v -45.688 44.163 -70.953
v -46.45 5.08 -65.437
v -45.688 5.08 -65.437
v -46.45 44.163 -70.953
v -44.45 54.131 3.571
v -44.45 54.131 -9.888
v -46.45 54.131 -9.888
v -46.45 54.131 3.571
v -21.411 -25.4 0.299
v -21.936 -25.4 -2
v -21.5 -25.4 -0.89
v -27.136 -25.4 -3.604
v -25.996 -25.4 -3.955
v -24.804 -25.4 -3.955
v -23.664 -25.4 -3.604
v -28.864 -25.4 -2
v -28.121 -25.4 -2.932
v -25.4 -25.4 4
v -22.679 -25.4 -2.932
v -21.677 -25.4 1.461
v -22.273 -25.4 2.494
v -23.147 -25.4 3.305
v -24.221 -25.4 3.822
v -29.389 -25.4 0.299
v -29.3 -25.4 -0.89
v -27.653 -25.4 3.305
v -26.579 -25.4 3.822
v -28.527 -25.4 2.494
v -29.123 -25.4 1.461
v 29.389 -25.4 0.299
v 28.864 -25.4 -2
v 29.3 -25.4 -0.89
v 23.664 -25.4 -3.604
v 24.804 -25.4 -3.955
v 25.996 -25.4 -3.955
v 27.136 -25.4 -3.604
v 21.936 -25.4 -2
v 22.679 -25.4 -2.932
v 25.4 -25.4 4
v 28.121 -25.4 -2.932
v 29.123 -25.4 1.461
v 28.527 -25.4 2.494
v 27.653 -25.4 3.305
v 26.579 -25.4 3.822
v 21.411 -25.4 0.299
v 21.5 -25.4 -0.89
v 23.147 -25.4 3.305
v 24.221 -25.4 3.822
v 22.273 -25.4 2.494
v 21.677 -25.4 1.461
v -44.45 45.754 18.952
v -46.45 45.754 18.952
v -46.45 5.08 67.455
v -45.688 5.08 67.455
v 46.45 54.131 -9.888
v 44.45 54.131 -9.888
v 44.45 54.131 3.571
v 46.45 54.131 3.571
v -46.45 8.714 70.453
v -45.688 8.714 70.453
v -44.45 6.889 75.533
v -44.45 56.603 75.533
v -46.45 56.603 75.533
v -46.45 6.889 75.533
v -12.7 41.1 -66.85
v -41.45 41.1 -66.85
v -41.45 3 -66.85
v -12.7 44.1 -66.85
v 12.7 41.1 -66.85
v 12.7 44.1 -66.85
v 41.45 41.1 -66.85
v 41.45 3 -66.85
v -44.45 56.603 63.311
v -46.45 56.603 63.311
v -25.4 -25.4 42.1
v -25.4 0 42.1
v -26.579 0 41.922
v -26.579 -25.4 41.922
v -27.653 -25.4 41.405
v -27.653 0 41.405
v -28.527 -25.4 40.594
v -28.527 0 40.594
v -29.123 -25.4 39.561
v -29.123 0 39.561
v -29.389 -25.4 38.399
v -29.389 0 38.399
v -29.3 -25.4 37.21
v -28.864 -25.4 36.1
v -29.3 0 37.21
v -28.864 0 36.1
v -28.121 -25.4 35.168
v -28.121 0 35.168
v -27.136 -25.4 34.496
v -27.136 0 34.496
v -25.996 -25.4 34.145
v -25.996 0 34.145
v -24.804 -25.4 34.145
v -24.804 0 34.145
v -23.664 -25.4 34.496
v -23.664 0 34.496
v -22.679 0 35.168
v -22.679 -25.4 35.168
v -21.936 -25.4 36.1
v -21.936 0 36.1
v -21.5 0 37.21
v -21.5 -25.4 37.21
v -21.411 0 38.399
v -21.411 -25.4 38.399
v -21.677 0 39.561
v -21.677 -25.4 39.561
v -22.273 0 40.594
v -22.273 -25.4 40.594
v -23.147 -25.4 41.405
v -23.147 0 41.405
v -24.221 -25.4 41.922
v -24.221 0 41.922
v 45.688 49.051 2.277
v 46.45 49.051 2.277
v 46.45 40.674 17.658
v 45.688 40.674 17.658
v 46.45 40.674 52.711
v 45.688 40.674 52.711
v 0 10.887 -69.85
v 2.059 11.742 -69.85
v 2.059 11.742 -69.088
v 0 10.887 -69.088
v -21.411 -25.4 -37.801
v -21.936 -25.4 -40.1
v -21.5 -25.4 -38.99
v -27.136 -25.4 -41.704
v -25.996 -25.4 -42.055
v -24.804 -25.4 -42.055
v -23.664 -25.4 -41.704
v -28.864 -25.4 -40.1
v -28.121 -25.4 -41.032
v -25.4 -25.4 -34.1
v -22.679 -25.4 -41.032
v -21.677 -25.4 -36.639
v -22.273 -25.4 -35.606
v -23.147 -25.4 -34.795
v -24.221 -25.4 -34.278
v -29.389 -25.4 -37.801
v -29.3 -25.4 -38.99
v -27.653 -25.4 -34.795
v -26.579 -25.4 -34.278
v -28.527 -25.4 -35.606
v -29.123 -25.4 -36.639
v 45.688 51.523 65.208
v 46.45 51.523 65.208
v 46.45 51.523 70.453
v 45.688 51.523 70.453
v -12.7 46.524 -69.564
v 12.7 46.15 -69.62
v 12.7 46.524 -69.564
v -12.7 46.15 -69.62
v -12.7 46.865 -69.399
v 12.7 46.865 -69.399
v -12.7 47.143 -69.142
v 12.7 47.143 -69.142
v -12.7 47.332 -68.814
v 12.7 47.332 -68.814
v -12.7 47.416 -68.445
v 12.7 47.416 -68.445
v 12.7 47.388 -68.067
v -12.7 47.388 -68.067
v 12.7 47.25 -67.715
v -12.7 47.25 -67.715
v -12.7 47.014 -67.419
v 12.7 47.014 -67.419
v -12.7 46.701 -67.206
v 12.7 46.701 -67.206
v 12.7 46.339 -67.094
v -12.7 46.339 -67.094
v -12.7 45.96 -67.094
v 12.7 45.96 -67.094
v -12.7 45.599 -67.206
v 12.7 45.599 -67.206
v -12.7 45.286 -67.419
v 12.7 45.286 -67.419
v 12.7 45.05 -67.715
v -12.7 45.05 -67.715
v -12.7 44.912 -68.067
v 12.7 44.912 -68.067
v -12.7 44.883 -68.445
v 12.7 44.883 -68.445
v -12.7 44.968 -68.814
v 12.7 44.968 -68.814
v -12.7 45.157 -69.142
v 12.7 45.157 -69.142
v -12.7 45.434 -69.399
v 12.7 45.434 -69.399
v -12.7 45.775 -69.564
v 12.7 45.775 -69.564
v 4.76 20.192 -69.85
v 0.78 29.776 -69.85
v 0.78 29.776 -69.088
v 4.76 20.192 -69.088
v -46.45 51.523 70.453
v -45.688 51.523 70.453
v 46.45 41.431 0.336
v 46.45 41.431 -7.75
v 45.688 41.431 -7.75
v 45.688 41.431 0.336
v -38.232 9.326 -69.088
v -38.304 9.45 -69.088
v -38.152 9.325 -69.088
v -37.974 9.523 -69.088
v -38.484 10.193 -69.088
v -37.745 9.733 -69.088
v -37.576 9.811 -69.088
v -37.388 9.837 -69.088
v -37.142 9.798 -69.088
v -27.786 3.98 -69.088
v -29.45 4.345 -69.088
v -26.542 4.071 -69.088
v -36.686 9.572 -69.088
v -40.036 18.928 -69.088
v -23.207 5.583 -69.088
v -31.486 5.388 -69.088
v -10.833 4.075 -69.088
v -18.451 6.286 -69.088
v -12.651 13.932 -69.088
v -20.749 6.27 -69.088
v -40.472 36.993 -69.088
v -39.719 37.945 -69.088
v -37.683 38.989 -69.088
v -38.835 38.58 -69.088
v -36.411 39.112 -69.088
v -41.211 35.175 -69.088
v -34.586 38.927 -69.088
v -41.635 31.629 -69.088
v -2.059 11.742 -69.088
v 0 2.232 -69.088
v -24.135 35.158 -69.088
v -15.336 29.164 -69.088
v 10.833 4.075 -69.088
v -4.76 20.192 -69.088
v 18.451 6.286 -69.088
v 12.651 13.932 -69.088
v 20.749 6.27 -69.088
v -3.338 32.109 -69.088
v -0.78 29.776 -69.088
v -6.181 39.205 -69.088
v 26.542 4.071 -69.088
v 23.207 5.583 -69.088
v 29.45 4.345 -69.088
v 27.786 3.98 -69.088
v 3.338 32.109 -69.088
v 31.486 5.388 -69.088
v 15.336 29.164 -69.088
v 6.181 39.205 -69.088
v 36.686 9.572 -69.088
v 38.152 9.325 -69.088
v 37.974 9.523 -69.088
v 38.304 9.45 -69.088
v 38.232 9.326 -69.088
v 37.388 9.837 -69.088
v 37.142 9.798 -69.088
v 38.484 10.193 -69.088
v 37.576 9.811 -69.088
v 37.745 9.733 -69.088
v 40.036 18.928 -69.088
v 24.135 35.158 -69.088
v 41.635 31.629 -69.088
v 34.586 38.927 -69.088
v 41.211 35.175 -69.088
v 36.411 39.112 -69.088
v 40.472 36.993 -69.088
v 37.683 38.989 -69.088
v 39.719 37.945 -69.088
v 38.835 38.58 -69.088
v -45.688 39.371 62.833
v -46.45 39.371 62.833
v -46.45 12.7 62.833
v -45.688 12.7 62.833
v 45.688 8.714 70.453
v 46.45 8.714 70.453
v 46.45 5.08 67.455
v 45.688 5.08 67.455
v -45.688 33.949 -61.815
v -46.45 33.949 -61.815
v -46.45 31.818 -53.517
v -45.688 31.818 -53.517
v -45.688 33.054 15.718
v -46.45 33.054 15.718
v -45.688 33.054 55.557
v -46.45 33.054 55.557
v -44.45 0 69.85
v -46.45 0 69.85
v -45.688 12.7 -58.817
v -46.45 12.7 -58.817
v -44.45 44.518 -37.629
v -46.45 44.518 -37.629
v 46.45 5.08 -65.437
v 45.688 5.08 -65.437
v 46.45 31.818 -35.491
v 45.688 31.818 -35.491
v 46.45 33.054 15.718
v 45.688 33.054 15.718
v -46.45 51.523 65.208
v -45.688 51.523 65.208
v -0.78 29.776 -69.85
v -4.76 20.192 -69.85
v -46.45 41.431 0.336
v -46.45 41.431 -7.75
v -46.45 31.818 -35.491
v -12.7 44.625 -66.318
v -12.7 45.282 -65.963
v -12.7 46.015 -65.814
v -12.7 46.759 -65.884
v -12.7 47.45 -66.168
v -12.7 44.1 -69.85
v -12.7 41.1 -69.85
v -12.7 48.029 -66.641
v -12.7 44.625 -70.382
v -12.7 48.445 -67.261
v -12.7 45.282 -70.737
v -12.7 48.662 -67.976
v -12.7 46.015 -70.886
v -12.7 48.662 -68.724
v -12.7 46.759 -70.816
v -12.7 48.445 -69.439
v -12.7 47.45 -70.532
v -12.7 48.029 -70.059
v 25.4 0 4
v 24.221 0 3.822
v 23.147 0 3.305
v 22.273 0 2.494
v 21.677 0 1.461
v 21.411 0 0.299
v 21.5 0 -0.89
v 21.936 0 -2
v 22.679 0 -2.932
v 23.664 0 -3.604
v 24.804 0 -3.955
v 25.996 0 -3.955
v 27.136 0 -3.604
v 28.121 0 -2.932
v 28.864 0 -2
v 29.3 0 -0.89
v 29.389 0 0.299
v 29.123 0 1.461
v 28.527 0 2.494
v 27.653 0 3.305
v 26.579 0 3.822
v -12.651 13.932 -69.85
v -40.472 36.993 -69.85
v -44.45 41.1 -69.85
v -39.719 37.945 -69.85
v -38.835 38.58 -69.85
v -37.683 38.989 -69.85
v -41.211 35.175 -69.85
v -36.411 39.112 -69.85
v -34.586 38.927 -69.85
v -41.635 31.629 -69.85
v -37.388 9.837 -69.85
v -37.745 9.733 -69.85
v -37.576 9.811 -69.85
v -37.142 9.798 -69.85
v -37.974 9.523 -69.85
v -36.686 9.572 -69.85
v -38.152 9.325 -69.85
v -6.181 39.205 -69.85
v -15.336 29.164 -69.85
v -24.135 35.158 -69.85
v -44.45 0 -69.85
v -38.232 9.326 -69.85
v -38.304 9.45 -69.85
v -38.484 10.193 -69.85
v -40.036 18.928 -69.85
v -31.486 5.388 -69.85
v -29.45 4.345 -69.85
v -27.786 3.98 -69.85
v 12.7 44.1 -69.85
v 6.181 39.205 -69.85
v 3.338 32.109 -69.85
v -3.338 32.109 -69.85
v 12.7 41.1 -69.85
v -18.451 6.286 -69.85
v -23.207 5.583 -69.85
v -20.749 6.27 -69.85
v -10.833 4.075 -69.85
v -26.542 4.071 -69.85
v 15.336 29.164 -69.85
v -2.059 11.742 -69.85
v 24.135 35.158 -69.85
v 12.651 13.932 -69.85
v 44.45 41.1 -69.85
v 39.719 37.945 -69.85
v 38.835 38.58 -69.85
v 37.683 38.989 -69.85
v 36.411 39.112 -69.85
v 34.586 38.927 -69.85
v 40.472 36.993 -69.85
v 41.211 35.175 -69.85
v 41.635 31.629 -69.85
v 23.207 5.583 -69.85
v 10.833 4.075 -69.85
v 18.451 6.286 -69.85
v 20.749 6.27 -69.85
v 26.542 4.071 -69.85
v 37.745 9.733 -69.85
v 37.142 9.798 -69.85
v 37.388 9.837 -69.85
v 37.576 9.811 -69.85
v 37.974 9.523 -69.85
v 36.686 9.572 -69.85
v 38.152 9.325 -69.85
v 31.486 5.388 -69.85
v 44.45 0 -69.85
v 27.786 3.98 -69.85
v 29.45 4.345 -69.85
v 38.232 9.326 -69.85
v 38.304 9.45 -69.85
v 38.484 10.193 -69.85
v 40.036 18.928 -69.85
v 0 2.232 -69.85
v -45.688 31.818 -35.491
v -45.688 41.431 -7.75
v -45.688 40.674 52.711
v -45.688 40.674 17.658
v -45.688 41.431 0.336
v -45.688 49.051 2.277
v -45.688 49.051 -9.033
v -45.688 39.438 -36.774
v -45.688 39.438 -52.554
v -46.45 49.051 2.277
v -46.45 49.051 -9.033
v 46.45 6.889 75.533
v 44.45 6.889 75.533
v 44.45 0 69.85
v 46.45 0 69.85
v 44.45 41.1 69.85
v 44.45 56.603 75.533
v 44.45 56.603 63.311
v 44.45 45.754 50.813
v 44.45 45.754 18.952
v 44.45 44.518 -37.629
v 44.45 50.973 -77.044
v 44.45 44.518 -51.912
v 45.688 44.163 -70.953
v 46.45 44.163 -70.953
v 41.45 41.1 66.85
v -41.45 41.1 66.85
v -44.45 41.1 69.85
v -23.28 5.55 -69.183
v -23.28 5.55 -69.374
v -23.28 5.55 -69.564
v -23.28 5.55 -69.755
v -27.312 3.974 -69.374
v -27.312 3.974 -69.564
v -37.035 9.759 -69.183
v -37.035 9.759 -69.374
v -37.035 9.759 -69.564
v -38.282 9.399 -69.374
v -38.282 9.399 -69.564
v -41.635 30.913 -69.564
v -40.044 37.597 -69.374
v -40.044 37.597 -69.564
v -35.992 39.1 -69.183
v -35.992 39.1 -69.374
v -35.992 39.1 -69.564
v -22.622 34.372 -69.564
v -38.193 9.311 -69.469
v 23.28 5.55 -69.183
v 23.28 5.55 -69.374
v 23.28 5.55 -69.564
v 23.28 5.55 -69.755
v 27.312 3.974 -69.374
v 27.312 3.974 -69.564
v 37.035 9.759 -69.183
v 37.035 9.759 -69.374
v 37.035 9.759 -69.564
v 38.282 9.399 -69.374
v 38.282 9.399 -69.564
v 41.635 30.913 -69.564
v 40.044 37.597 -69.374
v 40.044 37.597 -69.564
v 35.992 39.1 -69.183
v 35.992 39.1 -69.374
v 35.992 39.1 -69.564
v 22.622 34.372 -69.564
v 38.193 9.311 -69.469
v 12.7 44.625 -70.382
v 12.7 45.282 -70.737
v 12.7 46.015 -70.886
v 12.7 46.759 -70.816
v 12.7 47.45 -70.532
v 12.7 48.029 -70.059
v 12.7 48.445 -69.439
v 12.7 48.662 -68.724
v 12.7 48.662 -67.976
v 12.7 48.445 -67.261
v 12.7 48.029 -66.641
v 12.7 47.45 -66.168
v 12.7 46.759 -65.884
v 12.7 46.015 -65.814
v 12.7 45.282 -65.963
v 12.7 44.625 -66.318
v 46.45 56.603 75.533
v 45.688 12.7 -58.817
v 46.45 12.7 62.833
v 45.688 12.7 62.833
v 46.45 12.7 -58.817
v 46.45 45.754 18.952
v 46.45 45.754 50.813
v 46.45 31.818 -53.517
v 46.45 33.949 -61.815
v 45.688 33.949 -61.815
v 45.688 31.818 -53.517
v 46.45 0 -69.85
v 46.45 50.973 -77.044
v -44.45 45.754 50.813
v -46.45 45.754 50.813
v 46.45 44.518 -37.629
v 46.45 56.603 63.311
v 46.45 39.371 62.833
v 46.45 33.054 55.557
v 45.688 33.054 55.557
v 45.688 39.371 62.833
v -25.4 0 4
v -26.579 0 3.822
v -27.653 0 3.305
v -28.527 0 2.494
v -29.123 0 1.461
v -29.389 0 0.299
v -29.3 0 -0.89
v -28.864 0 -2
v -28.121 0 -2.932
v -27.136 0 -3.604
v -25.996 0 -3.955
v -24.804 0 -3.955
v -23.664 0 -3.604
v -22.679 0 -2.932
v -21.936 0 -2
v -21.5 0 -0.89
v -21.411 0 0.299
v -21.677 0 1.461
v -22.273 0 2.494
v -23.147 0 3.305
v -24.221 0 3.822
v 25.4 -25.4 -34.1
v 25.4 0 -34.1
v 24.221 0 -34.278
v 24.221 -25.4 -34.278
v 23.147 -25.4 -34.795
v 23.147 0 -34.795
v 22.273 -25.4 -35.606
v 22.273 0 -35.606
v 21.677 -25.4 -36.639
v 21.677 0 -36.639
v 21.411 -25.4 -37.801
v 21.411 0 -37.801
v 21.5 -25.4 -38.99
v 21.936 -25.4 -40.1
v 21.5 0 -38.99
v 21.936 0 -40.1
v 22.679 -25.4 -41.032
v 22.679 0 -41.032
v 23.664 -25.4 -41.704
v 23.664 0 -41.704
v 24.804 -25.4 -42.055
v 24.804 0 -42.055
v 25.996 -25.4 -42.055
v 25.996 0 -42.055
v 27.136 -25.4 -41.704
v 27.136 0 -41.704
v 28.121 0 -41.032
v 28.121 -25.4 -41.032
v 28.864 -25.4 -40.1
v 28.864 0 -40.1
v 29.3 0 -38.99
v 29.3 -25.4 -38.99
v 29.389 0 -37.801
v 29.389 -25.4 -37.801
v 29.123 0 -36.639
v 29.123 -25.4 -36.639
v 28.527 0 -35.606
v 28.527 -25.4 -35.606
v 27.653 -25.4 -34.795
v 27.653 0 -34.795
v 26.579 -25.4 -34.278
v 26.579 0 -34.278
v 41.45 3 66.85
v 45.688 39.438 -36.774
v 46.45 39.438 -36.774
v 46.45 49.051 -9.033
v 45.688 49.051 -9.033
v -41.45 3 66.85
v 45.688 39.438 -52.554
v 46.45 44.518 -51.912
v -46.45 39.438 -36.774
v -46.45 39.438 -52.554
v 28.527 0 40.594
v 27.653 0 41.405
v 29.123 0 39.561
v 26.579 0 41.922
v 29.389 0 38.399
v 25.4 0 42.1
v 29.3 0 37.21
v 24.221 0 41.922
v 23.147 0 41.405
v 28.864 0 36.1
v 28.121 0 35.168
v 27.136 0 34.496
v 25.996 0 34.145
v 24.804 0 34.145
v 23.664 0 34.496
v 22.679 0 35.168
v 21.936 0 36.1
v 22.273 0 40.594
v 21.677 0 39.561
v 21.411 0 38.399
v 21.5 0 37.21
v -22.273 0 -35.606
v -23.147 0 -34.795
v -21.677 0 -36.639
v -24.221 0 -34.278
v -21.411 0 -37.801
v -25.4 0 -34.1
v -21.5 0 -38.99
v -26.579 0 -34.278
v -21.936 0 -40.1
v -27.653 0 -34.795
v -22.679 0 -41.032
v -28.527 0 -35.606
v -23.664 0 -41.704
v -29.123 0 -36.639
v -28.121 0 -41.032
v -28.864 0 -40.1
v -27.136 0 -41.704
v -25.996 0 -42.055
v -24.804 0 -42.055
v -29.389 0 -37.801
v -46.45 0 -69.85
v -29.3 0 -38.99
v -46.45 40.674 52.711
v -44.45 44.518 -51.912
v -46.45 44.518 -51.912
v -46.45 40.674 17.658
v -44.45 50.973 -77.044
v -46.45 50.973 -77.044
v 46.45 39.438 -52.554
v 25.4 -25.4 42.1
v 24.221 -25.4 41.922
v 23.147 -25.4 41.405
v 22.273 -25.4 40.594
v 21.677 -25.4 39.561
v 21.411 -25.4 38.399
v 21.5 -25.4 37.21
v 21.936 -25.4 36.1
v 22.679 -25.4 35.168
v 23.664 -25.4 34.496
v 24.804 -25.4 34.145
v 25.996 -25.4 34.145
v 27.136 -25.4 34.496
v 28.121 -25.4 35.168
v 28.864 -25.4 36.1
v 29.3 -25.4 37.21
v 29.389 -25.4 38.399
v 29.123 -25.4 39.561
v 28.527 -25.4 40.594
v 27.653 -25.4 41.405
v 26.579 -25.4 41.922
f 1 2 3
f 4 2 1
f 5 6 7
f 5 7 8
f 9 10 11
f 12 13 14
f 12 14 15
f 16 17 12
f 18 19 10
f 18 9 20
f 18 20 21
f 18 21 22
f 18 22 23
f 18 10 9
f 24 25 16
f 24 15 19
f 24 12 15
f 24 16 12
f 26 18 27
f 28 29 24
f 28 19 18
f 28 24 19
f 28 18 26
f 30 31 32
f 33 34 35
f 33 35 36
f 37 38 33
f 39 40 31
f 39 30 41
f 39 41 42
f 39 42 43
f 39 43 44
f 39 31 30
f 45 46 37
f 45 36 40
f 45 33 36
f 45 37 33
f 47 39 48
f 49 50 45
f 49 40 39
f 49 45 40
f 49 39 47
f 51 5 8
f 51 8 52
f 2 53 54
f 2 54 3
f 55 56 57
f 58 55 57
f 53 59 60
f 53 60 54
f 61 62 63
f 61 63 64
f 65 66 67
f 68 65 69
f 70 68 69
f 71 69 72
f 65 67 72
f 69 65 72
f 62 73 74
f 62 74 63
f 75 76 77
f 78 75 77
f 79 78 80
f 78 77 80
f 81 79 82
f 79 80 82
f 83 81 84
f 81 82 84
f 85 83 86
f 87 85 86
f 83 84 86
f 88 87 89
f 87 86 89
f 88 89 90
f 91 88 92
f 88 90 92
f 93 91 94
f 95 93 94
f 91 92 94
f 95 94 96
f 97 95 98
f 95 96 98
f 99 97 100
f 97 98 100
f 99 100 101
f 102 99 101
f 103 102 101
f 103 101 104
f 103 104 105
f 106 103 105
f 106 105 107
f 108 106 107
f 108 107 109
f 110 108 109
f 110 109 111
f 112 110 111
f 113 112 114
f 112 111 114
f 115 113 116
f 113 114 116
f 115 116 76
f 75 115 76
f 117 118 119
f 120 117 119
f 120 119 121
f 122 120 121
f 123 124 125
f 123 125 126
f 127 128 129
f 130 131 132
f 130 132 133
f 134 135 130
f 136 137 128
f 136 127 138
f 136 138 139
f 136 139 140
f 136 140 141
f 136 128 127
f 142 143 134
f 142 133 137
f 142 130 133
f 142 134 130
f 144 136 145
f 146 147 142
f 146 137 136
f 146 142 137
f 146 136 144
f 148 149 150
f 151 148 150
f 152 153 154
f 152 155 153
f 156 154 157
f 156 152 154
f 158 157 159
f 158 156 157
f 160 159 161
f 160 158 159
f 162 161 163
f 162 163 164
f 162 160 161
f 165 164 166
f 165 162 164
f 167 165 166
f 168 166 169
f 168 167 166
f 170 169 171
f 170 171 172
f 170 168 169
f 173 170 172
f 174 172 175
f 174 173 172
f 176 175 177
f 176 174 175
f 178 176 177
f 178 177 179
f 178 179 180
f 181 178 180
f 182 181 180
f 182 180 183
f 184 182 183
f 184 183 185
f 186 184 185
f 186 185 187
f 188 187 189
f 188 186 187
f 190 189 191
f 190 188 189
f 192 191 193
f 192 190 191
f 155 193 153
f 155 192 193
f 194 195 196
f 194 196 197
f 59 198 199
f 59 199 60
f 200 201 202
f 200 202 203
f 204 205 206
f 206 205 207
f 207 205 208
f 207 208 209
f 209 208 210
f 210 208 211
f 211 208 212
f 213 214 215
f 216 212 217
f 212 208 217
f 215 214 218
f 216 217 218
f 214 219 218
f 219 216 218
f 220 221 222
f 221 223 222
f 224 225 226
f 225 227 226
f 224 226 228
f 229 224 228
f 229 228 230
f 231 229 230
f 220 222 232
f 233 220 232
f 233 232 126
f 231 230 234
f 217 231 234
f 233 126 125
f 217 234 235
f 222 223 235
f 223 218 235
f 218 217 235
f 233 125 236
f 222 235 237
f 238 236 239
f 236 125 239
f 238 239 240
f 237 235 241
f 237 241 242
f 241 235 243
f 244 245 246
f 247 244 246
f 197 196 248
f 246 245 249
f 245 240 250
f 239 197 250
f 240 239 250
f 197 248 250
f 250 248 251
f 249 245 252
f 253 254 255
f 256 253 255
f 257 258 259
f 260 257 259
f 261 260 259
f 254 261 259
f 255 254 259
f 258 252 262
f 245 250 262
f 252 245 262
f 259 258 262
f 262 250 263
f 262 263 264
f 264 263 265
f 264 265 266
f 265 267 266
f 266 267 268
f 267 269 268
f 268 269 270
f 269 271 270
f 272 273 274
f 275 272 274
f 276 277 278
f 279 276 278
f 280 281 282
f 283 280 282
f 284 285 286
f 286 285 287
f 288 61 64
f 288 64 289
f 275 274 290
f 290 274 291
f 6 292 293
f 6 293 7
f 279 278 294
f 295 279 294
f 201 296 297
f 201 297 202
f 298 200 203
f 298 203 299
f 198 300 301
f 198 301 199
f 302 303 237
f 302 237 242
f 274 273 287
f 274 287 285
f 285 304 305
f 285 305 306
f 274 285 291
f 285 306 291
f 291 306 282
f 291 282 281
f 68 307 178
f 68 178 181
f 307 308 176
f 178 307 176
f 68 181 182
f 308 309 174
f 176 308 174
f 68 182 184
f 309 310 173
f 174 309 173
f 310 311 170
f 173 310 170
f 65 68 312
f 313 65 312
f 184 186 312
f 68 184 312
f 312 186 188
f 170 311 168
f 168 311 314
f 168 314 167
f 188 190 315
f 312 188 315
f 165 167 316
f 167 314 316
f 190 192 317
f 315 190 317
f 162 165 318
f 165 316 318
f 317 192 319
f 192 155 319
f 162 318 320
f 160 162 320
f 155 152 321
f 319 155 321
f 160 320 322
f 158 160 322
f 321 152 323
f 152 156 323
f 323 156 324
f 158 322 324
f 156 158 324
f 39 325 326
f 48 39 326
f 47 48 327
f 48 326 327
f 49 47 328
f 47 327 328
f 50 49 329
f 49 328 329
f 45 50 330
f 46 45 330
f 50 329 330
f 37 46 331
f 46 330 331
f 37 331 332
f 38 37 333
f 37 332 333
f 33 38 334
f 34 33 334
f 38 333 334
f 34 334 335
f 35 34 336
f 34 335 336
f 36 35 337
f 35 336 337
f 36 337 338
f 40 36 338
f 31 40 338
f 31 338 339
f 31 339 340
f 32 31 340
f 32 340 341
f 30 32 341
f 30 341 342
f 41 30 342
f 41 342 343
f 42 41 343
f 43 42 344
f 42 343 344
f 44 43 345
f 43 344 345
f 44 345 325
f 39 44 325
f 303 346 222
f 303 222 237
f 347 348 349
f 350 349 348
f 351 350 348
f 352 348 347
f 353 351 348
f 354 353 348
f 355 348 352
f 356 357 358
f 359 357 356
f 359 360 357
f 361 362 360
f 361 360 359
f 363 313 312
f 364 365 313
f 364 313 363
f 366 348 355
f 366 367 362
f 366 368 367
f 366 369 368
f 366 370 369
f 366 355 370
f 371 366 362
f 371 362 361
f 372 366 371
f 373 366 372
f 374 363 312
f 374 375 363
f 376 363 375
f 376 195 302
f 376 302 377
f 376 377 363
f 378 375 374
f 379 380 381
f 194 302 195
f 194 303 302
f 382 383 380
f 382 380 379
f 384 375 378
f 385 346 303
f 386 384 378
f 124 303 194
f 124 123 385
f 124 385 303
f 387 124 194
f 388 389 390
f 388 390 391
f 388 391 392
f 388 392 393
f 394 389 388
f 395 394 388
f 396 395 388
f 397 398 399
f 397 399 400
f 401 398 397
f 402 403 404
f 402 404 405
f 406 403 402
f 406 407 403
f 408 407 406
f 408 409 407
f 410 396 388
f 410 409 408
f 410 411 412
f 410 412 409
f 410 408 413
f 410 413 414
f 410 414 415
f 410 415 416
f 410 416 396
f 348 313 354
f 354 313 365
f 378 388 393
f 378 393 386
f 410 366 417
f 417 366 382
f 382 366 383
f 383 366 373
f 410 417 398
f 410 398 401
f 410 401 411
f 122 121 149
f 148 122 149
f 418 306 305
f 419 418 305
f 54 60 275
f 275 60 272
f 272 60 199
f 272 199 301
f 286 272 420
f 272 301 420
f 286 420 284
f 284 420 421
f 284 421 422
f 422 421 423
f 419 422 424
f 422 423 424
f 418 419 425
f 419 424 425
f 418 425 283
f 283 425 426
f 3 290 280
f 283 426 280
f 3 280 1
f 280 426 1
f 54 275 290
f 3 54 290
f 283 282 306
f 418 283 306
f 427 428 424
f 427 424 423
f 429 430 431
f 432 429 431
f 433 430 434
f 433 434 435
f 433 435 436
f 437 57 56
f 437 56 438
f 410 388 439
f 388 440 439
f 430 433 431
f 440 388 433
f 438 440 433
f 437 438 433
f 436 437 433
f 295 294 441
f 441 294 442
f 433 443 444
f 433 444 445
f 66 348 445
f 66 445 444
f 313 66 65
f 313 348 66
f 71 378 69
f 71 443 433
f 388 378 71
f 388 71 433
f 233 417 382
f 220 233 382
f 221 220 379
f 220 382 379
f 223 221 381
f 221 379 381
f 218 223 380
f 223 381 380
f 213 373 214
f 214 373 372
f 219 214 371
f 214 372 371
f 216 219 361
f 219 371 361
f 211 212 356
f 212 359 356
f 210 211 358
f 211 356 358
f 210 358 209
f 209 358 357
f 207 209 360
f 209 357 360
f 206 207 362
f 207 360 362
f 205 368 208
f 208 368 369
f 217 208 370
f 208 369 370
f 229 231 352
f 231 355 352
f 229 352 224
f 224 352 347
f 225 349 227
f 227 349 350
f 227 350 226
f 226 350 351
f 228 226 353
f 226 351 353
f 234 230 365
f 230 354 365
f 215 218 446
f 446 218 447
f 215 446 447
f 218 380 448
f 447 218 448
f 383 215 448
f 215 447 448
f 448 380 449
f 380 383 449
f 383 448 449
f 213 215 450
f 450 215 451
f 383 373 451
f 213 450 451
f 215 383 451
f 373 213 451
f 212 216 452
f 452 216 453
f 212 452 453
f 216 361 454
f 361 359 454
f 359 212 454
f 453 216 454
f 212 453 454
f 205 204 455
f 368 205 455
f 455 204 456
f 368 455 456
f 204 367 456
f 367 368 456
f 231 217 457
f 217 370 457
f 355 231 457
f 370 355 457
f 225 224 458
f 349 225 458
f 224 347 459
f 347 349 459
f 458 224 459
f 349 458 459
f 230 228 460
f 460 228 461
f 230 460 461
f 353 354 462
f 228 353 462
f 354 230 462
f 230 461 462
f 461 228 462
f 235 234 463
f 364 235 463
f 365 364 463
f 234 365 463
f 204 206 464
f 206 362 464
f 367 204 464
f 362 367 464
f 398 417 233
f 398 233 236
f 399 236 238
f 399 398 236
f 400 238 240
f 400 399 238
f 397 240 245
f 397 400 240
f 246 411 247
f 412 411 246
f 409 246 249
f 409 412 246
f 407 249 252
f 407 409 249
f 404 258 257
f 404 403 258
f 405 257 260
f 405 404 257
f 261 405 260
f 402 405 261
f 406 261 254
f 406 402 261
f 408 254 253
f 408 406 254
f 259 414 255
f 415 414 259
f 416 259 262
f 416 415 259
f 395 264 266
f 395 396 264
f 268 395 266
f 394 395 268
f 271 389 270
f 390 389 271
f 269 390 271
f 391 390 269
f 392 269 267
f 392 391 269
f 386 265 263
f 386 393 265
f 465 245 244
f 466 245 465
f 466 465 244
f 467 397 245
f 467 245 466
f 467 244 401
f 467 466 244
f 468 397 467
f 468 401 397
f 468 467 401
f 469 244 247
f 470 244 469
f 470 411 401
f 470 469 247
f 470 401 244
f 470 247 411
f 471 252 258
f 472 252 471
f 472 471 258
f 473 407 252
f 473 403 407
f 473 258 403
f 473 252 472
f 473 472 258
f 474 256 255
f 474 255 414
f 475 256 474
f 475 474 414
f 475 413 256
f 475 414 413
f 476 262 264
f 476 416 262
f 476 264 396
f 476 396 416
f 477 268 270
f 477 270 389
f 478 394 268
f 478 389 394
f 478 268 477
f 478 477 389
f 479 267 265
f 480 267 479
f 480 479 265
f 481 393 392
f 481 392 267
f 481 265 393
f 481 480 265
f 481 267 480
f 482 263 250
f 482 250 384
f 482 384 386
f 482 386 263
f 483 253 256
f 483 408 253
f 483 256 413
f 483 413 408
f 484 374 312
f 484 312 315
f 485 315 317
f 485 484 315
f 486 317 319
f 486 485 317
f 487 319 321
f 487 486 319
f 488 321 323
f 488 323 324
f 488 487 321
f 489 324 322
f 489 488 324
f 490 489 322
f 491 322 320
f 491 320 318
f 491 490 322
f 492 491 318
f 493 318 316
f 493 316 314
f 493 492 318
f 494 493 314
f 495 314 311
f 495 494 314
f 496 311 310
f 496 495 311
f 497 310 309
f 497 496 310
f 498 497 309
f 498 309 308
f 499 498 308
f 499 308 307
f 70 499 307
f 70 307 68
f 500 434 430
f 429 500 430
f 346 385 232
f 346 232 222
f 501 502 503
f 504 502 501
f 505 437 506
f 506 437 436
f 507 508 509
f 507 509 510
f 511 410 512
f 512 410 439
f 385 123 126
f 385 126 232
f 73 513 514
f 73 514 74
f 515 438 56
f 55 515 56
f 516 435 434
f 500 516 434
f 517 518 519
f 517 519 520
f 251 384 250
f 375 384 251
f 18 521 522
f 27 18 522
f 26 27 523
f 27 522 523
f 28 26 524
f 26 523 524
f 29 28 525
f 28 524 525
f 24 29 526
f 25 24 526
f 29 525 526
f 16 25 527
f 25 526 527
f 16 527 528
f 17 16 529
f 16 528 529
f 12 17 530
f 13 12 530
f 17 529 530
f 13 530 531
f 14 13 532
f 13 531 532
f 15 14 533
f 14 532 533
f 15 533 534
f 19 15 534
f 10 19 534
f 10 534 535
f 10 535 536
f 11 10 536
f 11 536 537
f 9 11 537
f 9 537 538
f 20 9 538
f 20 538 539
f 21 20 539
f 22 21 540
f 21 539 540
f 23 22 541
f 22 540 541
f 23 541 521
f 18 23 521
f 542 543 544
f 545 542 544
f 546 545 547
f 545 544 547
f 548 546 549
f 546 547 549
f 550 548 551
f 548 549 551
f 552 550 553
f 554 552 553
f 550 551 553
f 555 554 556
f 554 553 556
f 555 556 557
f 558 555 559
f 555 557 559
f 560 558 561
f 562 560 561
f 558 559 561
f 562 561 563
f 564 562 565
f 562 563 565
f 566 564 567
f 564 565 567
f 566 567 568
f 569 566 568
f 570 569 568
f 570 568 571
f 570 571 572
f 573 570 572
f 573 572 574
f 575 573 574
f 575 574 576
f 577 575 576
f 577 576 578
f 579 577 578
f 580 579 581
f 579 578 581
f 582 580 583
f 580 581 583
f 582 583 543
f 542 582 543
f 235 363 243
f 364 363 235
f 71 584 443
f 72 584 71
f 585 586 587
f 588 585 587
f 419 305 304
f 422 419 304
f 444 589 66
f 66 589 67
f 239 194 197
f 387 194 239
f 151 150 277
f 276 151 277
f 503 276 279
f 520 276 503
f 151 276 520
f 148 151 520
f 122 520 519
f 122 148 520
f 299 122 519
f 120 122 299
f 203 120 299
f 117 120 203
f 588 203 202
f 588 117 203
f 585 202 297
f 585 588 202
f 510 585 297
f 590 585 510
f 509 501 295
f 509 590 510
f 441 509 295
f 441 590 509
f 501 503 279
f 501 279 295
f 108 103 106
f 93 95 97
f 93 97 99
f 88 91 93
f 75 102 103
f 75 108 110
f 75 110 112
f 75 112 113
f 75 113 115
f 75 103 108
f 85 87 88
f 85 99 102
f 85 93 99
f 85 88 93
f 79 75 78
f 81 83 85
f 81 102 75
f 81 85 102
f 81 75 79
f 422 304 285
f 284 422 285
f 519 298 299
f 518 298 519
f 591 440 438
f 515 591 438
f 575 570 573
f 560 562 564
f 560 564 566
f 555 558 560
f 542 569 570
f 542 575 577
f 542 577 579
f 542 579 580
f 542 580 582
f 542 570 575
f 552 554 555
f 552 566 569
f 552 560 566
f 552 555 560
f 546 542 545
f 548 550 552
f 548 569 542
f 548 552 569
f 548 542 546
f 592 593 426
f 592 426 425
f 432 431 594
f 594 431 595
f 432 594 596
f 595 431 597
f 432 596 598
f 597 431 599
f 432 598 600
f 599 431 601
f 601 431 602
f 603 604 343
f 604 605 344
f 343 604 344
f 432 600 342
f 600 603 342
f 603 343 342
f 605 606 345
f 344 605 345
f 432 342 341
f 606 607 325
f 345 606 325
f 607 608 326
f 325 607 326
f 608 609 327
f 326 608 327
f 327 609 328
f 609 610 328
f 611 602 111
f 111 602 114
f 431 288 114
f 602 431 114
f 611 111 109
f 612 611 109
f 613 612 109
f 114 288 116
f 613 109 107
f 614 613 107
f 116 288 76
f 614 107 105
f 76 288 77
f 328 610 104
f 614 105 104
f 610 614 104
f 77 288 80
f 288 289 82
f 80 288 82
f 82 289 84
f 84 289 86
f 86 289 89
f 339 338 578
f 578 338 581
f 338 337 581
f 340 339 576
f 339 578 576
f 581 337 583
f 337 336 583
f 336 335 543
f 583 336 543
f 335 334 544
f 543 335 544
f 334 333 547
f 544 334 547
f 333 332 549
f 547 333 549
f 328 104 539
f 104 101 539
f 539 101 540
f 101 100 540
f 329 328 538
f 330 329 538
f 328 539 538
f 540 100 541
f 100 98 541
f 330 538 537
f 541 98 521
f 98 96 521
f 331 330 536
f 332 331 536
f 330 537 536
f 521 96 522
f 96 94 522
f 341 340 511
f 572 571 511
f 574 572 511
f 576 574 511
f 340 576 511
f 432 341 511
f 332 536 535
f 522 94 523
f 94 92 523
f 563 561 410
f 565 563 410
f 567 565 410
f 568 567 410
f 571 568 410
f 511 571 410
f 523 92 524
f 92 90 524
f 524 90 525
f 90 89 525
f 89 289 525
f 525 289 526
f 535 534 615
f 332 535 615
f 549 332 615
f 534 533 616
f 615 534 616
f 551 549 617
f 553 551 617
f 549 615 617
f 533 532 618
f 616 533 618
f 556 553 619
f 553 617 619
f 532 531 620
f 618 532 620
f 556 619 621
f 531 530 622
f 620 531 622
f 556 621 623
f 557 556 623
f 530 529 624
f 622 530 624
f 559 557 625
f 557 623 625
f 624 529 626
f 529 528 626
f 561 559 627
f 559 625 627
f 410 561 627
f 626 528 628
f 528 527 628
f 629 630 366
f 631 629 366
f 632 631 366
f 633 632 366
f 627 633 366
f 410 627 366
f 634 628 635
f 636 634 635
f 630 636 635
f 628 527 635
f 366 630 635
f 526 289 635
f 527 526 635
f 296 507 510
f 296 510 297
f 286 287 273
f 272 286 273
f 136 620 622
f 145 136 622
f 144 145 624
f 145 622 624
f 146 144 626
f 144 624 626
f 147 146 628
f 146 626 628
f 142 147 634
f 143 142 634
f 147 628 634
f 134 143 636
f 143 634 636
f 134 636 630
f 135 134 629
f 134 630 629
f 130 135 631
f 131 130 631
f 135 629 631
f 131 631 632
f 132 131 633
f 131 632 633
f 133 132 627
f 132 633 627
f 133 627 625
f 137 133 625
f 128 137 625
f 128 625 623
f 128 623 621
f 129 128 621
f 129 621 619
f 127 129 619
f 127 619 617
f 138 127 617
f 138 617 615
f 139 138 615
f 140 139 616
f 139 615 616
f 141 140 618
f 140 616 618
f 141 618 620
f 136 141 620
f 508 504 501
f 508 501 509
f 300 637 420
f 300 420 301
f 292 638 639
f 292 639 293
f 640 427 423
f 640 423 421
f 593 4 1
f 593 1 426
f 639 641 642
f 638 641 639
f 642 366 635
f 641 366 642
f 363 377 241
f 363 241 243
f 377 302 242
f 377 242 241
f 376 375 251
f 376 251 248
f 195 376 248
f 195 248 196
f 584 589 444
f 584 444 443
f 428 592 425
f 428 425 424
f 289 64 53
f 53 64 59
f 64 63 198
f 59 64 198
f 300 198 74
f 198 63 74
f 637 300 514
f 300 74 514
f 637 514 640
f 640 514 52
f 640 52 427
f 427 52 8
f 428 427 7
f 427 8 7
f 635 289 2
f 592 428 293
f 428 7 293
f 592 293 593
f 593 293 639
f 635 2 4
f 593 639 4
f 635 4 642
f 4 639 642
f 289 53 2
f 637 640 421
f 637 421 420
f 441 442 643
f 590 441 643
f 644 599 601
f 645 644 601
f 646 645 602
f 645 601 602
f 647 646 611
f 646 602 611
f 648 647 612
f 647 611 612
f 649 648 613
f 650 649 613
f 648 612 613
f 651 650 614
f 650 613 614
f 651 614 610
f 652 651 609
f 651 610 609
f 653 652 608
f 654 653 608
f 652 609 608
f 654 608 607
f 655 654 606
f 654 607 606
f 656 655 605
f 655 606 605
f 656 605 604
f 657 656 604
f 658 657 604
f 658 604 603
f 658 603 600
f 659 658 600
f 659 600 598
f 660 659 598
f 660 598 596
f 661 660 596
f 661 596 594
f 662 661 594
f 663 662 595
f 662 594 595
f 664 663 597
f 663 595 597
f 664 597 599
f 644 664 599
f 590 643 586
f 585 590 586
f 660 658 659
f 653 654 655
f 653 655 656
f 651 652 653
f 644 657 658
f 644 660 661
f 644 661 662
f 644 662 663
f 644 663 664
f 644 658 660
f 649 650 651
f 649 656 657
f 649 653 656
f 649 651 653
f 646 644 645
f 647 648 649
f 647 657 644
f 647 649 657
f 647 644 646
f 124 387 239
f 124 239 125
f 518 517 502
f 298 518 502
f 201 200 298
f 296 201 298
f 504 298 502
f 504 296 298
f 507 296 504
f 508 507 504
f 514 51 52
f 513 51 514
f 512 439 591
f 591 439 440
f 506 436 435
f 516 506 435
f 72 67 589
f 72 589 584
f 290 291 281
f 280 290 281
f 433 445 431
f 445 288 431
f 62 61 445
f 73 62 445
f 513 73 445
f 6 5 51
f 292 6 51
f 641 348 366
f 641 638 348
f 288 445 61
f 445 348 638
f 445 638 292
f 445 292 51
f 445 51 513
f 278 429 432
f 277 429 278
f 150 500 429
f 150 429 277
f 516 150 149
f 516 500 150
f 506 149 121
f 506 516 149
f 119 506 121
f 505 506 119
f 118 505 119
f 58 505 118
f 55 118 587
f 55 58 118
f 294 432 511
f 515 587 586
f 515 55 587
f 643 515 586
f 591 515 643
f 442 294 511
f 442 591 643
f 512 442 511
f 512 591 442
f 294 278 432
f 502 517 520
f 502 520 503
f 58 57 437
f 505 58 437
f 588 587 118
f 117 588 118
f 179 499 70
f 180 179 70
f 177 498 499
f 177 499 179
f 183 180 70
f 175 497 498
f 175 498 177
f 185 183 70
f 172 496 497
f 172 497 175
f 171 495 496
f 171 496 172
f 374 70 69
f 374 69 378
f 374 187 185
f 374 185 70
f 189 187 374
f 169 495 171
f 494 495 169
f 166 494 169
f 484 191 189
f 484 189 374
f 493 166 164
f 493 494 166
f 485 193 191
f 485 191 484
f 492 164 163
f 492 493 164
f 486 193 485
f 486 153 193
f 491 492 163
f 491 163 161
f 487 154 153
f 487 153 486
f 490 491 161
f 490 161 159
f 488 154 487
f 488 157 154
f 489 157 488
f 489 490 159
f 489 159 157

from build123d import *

# Parameters (mm, degrees)
SKETCH2_W           = 88.9
SKETCH2_H           = 139.7
BOSS_EXTRUDE1_DEPTH = 3
SKETCH3_R           = 4
BOSS_EXTRUDE2_DEPTH = 25.4
SKETCH4_W           = 88.9
SKETCH4_H           = 139.7
SKETCH4_W_2         = 82.9
SKETCH4_H_2         = 133.7
BOSS_EXTRUDE3_DEPTH = 38.1
BOSS_EXTRUDE4_DEPTH = 2
SKETCH6_R           = 1.27
BOSS_EXTRUDE5_DEPTH = 12.7
CUT_EXTRUDE1_DEPTH  = 0.762
CUT_EXTRUDE6_DEPTH  = 0.762


with BuildPart() as part:
    # Sketch2 → Boss-Extrude1 (new body)
    with BuildSketch(Plane(origin=(0, 0, 0), x_dir=(1, 0, 0), z_dir=(0, 1, 0))):
        Rectangle(SKETCH2_W, SKETCH2_H)
    extrude(amount=BOSS_EXTRUDE1_DEPTH)

    # Sketch3 → Boss-Extrude2 (add)
    with BuildSketch(Plane.XZ):
        with Locations(Location((-25.4, 0, 0), (0, 0, 90))):
            Circle(SKETCH3_R)
        with Locations(Location((-25.4, 38.1, 0), (0, 0, 90))):
            Circle(SKETCH3_R)
        with Locations(Location((-25.4, -38.1, 0), (0, 0, 90))):
            Circle(SKETCH3_R)
        with Locations(Location((25.4, -38.1, 0), (0, 0, 90))):
            Circle(SKETCH3_R)
        with Locations(Location((25.4, 38.1, 0), (0, 0, 90))):
            Circle(SKETCH3_R)
        with Locations(Location((25.4, 0, 0), (0, 0, 90))):
            Circle(SKETCH3_R)
    extrude(amount=BOSS_EXTRUDE2_DEPTH)

    # Sketch4 → Boss-Extrude3 (add)
    with BuildSketch(Plane(origin=(0, 3, 0), x_dir=(1, 0, 0), z_dir=(0, 1, 0))):
        Rectangle(SKETCH4_W, SKETCH4_H)
        Rectangle(SKETCH4_W_2, SKETCH4_H_2, mode=Mode.SUBTRACT)
    extrude(amount=BOSS_EXTRUDE3_DEPTH)

    # Sketch5 → Boss-Extrude4 (add)
    with BuildSketch(Plane.ZY.offset(44.45)):
        Polygon((-69.85, 0), (-77.043871534, 50.972594762), (-51.91191344, 44.517938858), (-37.629270589, 44.517938858), (-9.887983512, 54.131256162), (3.570660713, 54.131256162), (18.951968399, 45.753936798), (50.813248605, 45.753936798), (63.3105611, 56.60325204), (75.533207386, 56.60325204), (75.533207386, 6.88866827), (69.85, 0), align=None)
    boss_extrude4 = extrude(amount=BOSS_EXTRUDE4_DEPTH)

    # Mirror1: Boss-Extrude4 across plane
    add(boss_extrude4.mirror(Plane(origin=(0, 0, 0), x_dir=(0, 0, 1), z_dir=(1, 0, 0))))

    # Sketch6 → Boss-Extrude5 (add, symmetric)
    with BuildSketch(Plane(origin=(0, 0, 0), x_dir=(0, 0, -1), z_dir=(1, 0, 0))):
        with BuildLine():
            Line((69.85, 41.1), (69.85, 44.1))
            ThreePointArc((69.85, 44.1), (68.35, 48.689780476), (66.85, 44.1))
            Line((66.85, 44.1), (66.85, 41.1))
            Line((66.85, 41.1), (69.85, 41.1))
        make_face()
        with Locations((68.35, 46.149780476)):
            Circle(SKETCH6_R, mode=Mode.SUBTRACT)
    extrude(amount=BOSS_EXTRUDE5_DEPTH, both=True)

    # Sketch8 → Cut-Extrude1 (cut)
    with BuildSketch(Plane(origin=(46.45, 0, 0), x_dir=(0, 0, -1), z_dir=(1, 0, 0))):
        Polygon((-67.455357815, 5.08), (65.436608301, 5.08), (70.952515373, 44.163280067), (52.553846412, 39.437938858), (36.774020754, 39.437938858), (9.032733678, 49.051256162), (-2.276983823, 49.051256162), (-17.658291509, 40.673936798), (-52.710677553, 40.673936798), (-65.207990048, 51.52325204), (-70.453207386, 51.52325204), (-70.453207386, 8.71372121), align=None)
        Polygon((-62.833207386, 12.7), (58.816520753, 12.7), (61.815481132, 33.949308024), (53.516745871, 31.817938858), (35.491146002, 31.817938858), (7.749858926, 41.431256162), (-0.336468488, 41.431256162), (-15.717776174, 33.053936798), (-55.556820974, 33.053936798), (-62.833207386, 39.370799727), align=None, mode=Mode.SUBTRACT)
    cut_extrude1 = extrude(amount=-CUT_EXTRUDE1_DEPTH, mode=Mode.SUBTRACT)

    # Mirror2: Cut-Extrude1 across plane
    add(cut_extrude1.mirror(Plane(origin=(0, 0, 0), x_dir=(0, 0, 1), z_dir=(1, 0, 0))), mode=Mode.SUBTRACT)

    # Sketch9 → Cut-Extrude6 (cut)
    with BuildSketch(Plane(origin=(0, 0, -69.85), x_dir=(-1, 0, 0), z_dir=(0, 0, -1))):
        with BuildLine():
            add(Edge.make_bspline(
                [(0, 2.232338579), (-3.191709729, 2.469022224), (-10.576818068, 3.01667051), (-19.626296774, 8.234734007), (-29.623964586, 1.483879995), (-40.159154339, 15.556067791), (-37.24863112, 4.012387296), (-44.245285678, 41.608866434), (-29.193824408, 38.042179171), (-20.009016941, 33.424397646), (-15.335608076, 29.1637284)],
                knots=[0, 0, 0, 0, 0.123775466, 0.286396729, 0.321356771, 0.473375892, 0.634369321, 0.669519432, 0.824876998, 1, 1, 1, 1], degree=3))
            Line((-15.335608076, 29.1637284), (-6.180896532, 39.205275306))
            Line((-6.180896532, 39.205275306), (-3.338363663, 32.108568953))
            Line((-3.338363663, 32.108568953), (-0.779698225, 29.775876168))
            Line((-0.779698225, 29.775876168), (-4.759630097, 20.191876056))
            Line((-4.759630097, 20.191876056), (-12.650845852, 13.932444189))
            Line((-12.650845852, 13.932444189), (-2.059030944, 11.741643035))
            Line((-2.059030944, 11.741643035), (0, 10.886592661))
            Line((0, 10.886592661), (2.059030944, 11.741643035))
            Line((2.059030944, 11.741643035), (12.650845852, 13.932444189))
            Line((12.650845852, 13.932444189), (4.759630097, 20.191876056))
            Line((4.759630097, 20.191876056), (0.779698225, 29.775876168))
            Line((0.779698225, 29.775876168), (3.338363663, 32.108568953))
            Line((3.338363663, 32.108568953), (6.180896532, 39.205275306))
            Line((6.180896532, 39.205275306), (15.335608076, 29.1637284))
            add(Edge.make_bspline(
                [(0, 2.232338579), (3.191709729, 2.469022224), (10.576818068, 3.01667051), (19.626296774, 8.234734007), (29.623964586, 1.483879995), (40.159154339, 15.556067791), (37.24863112, 4.012387296), (44.245285678, 41.608866434), (29.193824408, 38.042179171), (20.009016941, 33.424397646), (15.335608076, 29.1637284)],
                knots=[0, 0, 0, 0, 0.123775466, 0.286396729, 0.321356771, 0.473375892, 0.634369321, 0.669519432, 0.824876998, 1, 1, 1, 1], degree=3))
        make_face()
    extrude(amount=-CUT_EXTRUDE6_DEPTH, mode=Mode.SUBTRACT)


solid = part.part
